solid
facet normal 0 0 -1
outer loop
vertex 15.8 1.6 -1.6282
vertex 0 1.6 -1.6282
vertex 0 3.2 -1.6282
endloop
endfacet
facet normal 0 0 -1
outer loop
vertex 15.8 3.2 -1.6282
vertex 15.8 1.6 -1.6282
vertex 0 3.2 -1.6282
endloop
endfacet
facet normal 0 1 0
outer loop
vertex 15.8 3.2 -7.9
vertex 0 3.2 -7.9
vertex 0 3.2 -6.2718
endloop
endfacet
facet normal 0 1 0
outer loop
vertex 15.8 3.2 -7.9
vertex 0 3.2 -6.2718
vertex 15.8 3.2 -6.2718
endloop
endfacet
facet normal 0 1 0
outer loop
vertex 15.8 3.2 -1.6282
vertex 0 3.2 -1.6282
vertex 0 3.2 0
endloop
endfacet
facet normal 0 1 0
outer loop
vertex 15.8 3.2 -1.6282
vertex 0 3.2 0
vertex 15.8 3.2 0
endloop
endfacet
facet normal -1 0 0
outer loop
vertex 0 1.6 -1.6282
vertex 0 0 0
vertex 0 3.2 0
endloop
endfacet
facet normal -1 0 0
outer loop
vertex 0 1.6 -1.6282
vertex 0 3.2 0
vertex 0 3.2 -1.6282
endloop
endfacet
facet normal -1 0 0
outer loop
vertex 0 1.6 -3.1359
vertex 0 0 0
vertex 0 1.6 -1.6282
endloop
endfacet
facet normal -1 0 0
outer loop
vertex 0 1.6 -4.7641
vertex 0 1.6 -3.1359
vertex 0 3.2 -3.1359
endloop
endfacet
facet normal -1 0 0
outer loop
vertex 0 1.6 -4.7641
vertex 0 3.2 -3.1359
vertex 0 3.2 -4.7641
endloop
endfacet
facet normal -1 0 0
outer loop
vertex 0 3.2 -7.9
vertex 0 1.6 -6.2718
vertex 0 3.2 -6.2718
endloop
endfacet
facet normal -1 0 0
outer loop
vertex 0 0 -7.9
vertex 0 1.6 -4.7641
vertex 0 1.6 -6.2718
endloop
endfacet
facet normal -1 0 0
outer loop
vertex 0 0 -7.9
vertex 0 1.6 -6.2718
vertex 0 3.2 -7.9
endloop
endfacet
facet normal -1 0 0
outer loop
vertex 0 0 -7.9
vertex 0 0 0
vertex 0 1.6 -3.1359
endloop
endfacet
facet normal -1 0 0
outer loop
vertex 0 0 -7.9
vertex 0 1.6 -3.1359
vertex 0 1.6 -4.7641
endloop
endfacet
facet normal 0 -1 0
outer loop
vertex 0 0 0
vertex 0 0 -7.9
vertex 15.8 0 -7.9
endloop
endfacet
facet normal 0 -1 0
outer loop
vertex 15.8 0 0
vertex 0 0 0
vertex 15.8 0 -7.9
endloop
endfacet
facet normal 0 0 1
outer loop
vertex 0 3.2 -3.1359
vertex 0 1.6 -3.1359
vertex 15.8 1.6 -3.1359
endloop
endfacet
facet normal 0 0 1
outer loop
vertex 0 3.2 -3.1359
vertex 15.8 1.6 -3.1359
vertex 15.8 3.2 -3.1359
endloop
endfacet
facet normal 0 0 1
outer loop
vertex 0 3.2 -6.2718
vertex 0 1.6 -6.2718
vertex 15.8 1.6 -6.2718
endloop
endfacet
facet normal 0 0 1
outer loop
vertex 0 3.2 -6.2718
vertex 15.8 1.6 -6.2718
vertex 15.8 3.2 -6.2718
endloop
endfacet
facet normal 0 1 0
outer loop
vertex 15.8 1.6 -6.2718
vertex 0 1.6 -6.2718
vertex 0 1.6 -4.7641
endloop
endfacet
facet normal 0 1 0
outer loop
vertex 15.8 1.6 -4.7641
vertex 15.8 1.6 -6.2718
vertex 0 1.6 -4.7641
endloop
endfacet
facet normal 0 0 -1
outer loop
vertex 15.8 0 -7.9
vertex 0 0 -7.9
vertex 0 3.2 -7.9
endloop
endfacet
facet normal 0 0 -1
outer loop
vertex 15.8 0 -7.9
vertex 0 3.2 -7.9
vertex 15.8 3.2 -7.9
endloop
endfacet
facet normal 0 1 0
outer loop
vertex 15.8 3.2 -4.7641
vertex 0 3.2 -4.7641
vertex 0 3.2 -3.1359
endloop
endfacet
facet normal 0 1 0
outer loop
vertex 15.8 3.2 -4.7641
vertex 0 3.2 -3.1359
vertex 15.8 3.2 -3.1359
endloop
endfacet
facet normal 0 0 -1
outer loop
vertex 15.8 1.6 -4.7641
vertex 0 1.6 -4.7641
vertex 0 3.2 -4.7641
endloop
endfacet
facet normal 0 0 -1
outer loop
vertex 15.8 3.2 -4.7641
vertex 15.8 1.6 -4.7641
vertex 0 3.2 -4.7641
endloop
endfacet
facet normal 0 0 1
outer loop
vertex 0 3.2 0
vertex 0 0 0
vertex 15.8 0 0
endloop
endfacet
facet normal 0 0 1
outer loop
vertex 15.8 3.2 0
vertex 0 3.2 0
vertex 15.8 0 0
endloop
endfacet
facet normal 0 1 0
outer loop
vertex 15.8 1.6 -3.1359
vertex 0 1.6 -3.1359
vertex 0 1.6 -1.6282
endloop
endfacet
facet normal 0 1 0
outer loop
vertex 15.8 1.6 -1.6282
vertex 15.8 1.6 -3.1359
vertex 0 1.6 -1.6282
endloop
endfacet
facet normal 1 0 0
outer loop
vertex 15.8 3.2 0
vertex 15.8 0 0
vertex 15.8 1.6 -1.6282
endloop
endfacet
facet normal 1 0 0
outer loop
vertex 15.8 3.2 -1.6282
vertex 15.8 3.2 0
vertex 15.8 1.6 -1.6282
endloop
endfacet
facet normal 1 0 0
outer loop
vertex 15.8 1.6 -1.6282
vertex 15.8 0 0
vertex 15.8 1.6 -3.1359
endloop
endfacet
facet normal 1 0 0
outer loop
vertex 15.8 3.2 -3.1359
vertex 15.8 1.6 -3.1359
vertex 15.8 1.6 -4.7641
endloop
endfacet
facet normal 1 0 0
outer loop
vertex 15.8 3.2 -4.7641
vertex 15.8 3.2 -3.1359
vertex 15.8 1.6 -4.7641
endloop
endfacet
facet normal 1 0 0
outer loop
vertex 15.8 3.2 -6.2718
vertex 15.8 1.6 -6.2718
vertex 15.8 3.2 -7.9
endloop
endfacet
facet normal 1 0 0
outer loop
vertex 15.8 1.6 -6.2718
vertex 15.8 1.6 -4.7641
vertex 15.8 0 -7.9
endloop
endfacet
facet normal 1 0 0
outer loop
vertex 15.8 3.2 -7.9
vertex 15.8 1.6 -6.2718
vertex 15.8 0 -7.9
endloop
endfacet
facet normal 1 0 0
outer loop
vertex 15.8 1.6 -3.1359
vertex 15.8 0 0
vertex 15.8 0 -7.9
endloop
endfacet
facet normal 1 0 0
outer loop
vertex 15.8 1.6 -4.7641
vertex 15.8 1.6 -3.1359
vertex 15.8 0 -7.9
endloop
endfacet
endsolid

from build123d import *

# Parameters (mm, degrees)
SKETCH1_W           = 15.8
SKETCH1_H           = 7.9
BOSS_EXTRUDE1_DEPTH = 3.2
SKETCH2_W           = 1.507644264
SKETCH2_H           = 1.6
CUT_EXTRUDE1_DEPTH  = 15.8


with BuildPart() as part:
    # Sketch1 → Boss-Extrude1 (new body)
    with BuildSketch(Plane(origin=(0, 0, 0), x_dir=(1, 0, 0), z_dir=(0, 1, 0))):
        with Locations((7.9, 3.95)):
            Rectangle(SKETCH1_W, SKETCH1_H)
    extrude(amount=BOSS_EXTRUDE1_DEPTH)

    # Sketch2 → Cut-Extrude1 (cut)
    with BuildSketch(Plane.ZY):
        with Locations((-2.382059289, 2.4)):
            Rectangle(SKETCH2_W, SKETCH2_H)
        with Locations((-5.517940711, 2.4)):
            Rectangle(SKETCH2_W, SKETCH2_H)
    extrude(amount=-CUT_EXTRUDE1_DEPTH, mode=Mode.SUBTRACT)


solid = part.part
